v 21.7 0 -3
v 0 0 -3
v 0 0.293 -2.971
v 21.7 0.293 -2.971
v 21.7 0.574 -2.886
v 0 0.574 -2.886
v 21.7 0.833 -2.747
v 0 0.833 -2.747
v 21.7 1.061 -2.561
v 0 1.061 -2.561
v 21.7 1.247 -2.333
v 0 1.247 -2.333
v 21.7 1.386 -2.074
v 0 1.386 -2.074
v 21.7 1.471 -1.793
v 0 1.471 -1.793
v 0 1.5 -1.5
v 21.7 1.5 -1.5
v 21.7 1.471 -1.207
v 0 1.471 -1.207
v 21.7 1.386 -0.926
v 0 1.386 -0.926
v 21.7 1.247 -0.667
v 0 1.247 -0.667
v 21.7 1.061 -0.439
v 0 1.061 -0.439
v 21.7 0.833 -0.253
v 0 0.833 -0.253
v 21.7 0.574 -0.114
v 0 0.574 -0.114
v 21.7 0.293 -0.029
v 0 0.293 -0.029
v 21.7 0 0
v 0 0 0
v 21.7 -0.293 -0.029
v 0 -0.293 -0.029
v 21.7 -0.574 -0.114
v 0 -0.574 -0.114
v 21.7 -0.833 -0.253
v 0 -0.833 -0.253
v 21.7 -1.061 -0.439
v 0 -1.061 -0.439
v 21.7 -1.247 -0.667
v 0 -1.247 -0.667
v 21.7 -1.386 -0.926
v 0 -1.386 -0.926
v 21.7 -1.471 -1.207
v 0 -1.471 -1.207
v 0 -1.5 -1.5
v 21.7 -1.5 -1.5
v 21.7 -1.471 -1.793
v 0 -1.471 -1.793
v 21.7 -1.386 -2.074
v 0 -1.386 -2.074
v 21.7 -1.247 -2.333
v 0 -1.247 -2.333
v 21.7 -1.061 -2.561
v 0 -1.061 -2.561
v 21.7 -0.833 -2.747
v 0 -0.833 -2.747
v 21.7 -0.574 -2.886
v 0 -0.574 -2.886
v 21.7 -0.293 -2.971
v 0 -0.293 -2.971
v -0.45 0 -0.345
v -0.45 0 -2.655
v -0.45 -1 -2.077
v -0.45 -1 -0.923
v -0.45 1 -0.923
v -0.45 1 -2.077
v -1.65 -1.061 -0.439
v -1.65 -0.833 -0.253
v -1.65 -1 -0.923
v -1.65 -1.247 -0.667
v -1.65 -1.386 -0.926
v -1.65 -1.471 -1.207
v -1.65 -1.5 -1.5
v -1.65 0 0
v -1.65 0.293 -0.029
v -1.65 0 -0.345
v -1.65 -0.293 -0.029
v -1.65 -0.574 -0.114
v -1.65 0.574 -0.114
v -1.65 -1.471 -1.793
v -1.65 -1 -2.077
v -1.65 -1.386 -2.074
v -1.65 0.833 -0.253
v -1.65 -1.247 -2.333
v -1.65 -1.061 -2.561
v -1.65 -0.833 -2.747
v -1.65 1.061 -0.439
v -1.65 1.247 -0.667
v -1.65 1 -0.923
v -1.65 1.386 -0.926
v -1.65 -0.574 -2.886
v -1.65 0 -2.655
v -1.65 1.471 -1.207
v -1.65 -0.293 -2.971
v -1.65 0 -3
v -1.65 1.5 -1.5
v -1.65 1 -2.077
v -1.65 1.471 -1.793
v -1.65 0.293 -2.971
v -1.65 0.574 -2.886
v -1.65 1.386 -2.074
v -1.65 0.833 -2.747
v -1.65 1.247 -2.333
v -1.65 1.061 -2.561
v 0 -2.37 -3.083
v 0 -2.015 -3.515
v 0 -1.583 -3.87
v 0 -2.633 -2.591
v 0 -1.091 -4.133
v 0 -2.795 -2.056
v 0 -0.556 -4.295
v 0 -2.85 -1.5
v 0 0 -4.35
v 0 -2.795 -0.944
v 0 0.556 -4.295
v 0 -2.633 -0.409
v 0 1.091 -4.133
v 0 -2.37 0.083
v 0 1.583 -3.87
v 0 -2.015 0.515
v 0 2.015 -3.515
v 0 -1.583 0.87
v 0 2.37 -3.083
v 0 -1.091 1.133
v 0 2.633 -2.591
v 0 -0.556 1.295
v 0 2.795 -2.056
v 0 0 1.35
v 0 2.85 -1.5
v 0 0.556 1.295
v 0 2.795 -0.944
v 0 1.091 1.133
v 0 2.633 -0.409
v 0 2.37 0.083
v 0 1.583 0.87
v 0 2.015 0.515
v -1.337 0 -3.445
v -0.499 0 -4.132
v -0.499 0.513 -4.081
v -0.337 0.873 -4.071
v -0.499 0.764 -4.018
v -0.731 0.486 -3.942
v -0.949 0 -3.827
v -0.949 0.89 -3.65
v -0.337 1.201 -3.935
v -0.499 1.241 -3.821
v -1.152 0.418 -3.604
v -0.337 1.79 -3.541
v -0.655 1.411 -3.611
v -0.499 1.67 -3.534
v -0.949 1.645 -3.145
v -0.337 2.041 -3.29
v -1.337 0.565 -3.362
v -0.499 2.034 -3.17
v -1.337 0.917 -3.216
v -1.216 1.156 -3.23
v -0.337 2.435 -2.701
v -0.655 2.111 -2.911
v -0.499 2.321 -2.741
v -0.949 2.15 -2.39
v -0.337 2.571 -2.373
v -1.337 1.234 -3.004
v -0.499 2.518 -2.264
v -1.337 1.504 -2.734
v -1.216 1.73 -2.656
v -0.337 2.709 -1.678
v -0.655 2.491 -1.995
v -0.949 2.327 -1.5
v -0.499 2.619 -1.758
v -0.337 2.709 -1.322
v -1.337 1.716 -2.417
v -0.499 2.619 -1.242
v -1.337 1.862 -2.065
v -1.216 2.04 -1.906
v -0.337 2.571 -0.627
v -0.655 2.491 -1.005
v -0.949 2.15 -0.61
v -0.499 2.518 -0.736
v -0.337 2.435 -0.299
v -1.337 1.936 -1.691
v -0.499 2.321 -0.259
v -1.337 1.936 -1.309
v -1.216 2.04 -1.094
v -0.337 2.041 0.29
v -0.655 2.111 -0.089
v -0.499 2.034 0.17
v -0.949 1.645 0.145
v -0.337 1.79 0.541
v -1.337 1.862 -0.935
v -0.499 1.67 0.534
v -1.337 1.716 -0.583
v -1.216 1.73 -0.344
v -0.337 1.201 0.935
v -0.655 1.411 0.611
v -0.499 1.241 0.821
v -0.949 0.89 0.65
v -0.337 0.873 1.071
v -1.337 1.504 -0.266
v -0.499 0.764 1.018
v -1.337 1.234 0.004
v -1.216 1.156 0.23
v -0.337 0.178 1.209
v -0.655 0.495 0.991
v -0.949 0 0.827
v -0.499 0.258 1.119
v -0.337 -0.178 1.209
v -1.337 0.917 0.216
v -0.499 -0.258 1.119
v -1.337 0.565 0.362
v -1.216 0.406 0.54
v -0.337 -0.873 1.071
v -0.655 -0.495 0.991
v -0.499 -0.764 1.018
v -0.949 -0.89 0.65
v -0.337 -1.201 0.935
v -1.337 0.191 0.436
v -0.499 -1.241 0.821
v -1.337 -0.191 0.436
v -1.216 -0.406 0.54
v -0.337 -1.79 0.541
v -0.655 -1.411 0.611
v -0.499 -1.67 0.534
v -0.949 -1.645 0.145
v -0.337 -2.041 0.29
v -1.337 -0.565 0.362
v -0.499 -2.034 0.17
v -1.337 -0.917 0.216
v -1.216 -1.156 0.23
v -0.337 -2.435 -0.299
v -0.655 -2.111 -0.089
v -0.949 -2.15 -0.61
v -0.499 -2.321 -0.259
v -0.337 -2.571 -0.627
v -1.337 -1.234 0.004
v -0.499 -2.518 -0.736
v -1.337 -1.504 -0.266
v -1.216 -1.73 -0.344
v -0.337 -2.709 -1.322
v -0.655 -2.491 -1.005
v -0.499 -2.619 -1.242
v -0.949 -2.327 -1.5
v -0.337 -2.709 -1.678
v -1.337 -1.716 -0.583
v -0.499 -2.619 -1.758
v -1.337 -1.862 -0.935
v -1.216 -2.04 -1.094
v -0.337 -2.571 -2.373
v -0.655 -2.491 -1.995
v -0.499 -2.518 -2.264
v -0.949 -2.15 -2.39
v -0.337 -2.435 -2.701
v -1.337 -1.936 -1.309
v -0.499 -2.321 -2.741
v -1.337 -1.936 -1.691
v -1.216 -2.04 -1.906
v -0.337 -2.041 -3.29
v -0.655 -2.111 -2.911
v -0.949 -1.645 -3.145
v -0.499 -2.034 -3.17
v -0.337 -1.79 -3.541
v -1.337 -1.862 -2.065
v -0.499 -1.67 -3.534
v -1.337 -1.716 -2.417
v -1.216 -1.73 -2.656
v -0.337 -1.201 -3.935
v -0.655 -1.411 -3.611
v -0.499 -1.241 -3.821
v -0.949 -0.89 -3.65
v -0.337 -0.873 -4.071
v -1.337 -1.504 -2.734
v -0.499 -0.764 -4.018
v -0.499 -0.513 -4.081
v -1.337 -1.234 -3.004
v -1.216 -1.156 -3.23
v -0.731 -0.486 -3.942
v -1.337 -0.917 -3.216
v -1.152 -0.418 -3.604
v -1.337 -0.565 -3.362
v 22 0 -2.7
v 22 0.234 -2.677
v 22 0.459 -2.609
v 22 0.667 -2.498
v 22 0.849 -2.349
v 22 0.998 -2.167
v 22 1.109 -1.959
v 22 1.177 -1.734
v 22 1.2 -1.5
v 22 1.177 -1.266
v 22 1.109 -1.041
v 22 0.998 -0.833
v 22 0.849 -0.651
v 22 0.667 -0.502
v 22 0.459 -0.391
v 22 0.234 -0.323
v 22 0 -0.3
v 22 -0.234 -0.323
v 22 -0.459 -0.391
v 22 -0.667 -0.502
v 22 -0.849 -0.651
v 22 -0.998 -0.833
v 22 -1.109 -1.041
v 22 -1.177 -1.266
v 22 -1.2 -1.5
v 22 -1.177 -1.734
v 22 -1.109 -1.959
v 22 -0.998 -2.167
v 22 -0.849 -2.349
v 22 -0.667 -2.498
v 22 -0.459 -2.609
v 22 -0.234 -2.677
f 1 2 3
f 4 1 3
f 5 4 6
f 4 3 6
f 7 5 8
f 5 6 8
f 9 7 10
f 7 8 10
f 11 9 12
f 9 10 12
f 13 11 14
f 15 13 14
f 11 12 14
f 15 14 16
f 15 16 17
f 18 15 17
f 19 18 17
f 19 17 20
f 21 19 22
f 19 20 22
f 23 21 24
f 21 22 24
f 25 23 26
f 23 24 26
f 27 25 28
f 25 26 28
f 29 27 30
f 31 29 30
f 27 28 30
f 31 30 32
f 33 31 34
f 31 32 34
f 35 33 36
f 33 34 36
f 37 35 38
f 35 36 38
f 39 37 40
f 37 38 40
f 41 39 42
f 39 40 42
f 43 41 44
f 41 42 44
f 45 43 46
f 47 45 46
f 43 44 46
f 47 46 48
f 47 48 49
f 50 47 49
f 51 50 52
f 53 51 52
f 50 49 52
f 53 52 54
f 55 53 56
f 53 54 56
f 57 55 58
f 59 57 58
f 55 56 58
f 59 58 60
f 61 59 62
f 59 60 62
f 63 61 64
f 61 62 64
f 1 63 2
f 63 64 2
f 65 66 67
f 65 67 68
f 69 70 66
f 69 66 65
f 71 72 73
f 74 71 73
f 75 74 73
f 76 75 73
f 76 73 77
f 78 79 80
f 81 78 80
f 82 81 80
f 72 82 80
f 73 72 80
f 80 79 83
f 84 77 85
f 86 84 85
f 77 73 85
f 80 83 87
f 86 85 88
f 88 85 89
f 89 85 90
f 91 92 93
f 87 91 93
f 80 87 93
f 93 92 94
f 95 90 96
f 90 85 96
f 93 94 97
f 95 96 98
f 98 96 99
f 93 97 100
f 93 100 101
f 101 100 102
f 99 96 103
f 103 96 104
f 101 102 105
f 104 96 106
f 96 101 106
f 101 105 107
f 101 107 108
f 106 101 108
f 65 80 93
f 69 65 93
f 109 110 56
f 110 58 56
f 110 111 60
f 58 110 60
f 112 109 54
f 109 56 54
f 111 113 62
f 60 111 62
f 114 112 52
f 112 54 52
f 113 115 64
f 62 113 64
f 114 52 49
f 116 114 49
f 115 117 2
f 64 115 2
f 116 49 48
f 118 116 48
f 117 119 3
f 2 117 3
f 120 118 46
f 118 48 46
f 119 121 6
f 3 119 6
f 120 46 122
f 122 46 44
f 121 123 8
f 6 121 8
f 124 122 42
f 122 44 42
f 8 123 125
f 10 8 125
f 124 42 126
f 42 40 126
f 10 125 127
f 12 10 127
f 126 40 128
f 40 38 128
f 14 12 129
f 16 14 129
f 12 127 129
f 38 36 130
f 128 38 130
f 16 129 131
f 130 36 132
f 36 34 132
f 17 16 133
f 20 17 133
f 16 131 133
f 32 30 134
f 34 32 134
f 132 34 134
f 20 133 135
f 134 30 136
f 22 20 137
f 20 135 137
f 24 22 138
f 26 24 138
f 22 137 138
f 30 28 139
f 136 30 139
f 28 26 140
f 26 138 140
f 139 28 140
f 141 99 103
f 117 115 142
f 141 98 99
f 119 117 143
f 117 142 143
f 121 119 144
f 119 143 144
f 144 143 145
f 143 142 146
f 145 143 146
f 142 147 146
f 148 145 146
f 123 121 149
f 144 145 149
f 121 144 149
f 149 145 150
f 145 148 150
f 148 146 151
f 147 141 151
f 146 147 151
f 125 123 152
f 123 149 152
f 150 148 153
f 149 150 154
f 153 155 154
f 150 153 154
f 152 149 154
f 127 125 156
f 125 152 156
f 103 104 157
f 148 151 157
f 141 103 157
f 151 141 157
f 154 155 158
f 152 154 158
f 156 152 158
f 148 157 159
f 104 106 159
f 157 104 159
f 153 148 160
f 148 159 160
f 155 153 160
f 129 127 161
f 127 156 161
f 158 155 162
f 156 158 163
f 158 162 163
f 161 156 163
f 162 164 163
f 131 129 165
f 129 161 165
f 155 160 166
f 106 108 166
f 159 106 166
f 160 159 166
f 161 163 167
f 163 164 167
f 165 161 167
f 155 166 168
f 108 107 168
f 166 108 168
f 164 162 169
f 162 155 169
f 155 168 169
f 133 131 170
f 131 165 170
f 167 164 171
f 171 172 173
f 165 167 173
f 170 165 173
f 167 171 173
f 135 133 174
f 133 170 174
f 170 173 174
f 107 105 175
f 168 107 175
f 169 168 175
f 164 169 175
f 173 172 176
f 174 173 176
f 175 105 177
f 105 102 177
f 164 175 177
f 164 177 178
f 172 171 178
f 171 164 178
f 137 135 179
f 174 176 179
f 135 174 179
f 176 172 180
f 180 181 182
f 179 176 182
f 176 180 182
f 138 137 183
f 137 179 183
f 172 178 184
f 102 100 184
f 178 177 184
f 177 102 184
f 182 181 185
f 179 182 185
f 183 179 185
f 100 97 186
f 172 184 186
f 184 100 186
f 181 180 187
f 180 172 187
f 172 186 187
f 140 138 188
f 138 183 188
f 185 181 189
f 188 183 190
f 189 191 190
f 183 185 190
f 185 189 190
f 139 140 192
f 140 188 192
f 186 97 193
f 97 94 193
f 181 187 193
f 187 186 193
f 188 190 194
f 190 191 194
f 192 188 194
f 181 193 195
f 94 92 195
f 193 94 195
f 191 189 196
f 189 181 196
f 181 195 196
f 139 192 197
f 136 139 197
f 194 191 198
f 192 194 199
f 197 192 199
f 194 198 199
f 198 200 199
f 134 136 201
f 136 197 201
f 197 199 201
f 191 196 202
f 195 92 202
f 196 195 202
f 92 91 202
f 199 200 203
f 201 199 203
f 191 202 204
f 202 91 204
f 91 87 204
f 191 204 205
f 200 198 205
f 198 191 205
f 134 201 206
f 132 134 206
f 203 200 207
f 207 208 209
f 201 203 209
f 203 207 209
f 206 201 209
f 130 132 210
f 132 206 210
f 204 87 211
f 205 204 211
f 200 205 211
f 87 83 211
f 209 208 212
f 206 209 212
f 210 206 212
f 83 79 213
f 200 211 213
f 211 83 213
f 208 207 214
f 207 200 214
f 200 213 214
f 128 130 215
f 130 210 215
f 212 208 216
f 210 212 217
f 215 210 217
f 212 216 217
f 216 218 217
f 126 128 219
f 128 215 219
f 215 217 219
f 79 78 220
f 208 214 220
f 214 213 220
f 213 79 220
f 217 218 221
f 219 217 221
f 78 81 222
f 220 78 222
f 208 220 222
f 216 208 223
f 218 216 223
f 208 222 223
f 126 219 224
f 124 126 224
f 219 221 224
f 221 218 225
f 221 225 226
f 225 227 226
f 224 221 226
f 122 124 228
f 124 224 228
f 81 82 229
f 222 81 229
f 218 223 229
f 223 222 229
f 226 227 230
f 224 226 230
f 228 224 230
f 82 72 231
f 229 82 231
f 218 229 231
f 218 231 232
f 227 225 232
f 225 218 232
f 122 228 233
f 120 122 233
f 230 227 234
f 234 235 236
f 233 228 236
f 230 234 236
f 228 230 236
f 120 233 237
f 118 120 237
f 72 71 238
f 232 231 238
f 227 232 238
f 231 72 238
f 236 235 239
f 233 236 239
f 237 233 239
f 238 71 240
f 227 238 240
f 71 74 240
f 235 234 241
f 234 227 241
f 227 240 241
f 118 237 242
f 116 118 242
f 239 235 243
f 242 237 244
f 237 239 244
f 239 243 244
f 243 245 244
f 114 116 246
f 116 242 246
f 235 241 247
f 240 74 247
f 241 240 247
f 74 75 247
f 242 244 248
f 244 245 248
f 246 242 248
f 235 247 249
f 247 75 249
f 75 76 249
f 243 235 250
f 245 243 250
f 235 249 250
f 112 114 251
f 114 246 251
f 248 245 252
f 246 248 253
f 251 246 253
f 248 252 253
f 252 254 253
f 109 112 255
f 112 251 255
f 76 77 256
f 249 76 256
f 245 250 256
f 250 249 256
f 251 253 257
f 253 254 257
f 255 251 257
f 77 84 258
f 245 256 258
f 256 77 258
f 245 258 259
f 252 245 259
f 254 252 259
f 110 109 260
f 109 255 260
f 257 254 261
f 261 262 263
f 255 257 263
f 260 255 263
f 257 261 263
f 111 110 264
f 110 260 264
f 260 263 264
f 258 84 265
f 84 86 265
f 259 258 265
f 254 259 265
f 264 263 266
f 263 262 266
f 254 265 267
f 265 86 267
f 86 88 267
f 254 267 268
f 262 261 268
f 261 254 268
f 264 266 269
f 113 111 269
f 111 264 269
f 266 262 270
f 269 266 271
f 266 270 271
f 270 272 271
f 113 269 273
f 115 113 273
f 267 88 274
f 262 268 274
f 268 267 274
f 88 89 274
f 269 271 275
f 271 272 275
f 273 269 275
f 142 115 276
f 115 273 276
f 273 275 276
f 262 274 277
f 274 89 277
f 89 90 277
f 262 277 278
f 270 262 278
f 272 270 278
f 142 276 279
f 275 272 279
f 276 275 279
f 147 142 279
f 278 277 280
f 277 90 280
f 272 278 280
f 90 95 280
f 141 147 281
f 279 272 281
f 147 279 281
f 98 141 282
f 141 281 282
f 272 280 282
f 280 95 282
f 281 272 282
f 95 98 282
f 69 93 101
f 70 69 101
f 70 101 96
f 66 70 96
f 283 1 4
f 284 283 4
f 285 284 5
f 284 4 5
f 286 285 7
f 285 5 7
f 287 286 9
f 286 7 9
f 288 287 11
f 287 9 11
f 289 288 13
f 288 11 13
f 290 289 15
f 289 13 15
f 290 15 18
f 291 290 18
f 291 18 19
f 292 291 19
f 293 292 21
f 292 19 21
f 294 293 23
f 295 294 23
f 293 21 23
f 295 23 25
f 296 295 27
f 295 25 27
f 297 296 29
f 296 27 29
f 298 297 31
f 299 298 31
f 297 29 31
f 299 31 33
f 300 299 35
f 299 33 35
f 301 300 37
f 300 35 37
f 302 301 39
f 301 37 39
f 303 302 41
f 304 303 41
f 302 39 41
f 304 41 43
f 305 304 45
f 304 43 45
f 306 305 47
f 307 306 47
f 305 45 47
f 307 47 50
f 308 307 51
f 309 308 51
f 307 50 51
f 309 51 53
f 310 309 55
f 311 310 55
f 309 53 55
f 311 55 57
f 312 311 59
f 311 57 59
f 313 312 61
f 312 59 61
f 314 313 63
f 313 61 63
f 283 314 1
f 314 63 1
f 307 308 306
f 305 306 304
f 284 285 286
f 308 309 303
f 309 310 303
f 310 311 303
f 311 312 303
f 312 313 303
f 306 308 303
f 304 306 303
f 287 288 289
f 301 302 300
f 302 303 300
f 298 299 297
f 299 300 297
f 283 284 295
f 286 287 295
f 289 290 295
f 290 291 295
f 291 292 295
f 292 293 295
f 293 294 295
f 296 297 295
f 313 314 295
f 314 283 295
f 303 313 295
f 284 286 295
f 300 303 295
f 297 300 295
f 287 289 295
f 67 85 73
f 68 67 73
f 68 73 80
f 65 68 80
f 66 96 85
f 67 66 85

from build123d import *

# Parameters (mm, degrees)
CHAMFER1_SIZE      = 0.3
CUT_EXTRUDE1_DEPTH = 1.2


with BuildPart() as part:
    # Sketch1 → Revolve1 (revolve)
    with BuildSketch(Plane(origin=(0, 0, 0), x_dir=(1, 0, 0), z_dir=(0, 1, 0))):
        with BuildLine():
            ThreePointArc((3.937869631, 1.510997792), (3.937864578, 1.505498886), (3.937849421, 1.5))
            Line((3.937849421, 1.5), (22, 1.5))
            Line((22, 1.5), (22, 3))
            Line((22, 3), (3.541094523, 3))
            ThreePointArc((3.541094523, 3), (3.836974876, 2.281477847), (3.937869631, 1.510997792))
        make_face()
        with BuildLine():
            Line((0, 3), (0, 1.5))
            Line((0, 1.5), (3.937849421, 1.5))
            ThreePointArc((3.937849421, 1.5), (3.937864578, 1.505498886), (3.937869631, 1.510997792))
            ThreePointArc((3.937869631, 1.510997792), (3.836974876, 2.281477847), (3.541094523, 3))
            Line((3.541094523, 3), (0, 3))
        make_face()
        with BuildLine():
            Line((-1.65, 1.5), (0, 1.5))
            Line((0, 1.5), (0, 3))
            Line((0, 3), (0, 4.35))
            ThreePointArc((0, 4.35), (-0.949304344, 3.826927531), (-1.65, 3))
            Line((-1.65, 3), (-1.65, 2.5))
            Line((-1.65, 2.5), (-1.65, 1.5))
        make_face()
    revolve(axis=Axis((0, 0, -1.5), (1, 0, 0)))

    # Chamfer1
    chamfer1_edges = [part.edges().sort_by_distance(p)[0] for p in [
        (22, 0, 0),
    ]]
    chamfer(chamfer1_edges, length=CHAMFER1_SIZE)

    # Sketch2 → Cut-Extrude1 (cut)
    with BuildSketch(Plane.ZY.offset(1.65)):
        Polygon((-0.345299462, 0), (-0.922649731, 1), (-2.077350269, 1), (-2.654700538, 0), (-2.077350269, -1), (-0.922649731, -1), align=None)
    extrude(amount=-CUT_EXTRUDE1_DEPTH, mode=Mode.SUBTRACT)


solid = part.part
